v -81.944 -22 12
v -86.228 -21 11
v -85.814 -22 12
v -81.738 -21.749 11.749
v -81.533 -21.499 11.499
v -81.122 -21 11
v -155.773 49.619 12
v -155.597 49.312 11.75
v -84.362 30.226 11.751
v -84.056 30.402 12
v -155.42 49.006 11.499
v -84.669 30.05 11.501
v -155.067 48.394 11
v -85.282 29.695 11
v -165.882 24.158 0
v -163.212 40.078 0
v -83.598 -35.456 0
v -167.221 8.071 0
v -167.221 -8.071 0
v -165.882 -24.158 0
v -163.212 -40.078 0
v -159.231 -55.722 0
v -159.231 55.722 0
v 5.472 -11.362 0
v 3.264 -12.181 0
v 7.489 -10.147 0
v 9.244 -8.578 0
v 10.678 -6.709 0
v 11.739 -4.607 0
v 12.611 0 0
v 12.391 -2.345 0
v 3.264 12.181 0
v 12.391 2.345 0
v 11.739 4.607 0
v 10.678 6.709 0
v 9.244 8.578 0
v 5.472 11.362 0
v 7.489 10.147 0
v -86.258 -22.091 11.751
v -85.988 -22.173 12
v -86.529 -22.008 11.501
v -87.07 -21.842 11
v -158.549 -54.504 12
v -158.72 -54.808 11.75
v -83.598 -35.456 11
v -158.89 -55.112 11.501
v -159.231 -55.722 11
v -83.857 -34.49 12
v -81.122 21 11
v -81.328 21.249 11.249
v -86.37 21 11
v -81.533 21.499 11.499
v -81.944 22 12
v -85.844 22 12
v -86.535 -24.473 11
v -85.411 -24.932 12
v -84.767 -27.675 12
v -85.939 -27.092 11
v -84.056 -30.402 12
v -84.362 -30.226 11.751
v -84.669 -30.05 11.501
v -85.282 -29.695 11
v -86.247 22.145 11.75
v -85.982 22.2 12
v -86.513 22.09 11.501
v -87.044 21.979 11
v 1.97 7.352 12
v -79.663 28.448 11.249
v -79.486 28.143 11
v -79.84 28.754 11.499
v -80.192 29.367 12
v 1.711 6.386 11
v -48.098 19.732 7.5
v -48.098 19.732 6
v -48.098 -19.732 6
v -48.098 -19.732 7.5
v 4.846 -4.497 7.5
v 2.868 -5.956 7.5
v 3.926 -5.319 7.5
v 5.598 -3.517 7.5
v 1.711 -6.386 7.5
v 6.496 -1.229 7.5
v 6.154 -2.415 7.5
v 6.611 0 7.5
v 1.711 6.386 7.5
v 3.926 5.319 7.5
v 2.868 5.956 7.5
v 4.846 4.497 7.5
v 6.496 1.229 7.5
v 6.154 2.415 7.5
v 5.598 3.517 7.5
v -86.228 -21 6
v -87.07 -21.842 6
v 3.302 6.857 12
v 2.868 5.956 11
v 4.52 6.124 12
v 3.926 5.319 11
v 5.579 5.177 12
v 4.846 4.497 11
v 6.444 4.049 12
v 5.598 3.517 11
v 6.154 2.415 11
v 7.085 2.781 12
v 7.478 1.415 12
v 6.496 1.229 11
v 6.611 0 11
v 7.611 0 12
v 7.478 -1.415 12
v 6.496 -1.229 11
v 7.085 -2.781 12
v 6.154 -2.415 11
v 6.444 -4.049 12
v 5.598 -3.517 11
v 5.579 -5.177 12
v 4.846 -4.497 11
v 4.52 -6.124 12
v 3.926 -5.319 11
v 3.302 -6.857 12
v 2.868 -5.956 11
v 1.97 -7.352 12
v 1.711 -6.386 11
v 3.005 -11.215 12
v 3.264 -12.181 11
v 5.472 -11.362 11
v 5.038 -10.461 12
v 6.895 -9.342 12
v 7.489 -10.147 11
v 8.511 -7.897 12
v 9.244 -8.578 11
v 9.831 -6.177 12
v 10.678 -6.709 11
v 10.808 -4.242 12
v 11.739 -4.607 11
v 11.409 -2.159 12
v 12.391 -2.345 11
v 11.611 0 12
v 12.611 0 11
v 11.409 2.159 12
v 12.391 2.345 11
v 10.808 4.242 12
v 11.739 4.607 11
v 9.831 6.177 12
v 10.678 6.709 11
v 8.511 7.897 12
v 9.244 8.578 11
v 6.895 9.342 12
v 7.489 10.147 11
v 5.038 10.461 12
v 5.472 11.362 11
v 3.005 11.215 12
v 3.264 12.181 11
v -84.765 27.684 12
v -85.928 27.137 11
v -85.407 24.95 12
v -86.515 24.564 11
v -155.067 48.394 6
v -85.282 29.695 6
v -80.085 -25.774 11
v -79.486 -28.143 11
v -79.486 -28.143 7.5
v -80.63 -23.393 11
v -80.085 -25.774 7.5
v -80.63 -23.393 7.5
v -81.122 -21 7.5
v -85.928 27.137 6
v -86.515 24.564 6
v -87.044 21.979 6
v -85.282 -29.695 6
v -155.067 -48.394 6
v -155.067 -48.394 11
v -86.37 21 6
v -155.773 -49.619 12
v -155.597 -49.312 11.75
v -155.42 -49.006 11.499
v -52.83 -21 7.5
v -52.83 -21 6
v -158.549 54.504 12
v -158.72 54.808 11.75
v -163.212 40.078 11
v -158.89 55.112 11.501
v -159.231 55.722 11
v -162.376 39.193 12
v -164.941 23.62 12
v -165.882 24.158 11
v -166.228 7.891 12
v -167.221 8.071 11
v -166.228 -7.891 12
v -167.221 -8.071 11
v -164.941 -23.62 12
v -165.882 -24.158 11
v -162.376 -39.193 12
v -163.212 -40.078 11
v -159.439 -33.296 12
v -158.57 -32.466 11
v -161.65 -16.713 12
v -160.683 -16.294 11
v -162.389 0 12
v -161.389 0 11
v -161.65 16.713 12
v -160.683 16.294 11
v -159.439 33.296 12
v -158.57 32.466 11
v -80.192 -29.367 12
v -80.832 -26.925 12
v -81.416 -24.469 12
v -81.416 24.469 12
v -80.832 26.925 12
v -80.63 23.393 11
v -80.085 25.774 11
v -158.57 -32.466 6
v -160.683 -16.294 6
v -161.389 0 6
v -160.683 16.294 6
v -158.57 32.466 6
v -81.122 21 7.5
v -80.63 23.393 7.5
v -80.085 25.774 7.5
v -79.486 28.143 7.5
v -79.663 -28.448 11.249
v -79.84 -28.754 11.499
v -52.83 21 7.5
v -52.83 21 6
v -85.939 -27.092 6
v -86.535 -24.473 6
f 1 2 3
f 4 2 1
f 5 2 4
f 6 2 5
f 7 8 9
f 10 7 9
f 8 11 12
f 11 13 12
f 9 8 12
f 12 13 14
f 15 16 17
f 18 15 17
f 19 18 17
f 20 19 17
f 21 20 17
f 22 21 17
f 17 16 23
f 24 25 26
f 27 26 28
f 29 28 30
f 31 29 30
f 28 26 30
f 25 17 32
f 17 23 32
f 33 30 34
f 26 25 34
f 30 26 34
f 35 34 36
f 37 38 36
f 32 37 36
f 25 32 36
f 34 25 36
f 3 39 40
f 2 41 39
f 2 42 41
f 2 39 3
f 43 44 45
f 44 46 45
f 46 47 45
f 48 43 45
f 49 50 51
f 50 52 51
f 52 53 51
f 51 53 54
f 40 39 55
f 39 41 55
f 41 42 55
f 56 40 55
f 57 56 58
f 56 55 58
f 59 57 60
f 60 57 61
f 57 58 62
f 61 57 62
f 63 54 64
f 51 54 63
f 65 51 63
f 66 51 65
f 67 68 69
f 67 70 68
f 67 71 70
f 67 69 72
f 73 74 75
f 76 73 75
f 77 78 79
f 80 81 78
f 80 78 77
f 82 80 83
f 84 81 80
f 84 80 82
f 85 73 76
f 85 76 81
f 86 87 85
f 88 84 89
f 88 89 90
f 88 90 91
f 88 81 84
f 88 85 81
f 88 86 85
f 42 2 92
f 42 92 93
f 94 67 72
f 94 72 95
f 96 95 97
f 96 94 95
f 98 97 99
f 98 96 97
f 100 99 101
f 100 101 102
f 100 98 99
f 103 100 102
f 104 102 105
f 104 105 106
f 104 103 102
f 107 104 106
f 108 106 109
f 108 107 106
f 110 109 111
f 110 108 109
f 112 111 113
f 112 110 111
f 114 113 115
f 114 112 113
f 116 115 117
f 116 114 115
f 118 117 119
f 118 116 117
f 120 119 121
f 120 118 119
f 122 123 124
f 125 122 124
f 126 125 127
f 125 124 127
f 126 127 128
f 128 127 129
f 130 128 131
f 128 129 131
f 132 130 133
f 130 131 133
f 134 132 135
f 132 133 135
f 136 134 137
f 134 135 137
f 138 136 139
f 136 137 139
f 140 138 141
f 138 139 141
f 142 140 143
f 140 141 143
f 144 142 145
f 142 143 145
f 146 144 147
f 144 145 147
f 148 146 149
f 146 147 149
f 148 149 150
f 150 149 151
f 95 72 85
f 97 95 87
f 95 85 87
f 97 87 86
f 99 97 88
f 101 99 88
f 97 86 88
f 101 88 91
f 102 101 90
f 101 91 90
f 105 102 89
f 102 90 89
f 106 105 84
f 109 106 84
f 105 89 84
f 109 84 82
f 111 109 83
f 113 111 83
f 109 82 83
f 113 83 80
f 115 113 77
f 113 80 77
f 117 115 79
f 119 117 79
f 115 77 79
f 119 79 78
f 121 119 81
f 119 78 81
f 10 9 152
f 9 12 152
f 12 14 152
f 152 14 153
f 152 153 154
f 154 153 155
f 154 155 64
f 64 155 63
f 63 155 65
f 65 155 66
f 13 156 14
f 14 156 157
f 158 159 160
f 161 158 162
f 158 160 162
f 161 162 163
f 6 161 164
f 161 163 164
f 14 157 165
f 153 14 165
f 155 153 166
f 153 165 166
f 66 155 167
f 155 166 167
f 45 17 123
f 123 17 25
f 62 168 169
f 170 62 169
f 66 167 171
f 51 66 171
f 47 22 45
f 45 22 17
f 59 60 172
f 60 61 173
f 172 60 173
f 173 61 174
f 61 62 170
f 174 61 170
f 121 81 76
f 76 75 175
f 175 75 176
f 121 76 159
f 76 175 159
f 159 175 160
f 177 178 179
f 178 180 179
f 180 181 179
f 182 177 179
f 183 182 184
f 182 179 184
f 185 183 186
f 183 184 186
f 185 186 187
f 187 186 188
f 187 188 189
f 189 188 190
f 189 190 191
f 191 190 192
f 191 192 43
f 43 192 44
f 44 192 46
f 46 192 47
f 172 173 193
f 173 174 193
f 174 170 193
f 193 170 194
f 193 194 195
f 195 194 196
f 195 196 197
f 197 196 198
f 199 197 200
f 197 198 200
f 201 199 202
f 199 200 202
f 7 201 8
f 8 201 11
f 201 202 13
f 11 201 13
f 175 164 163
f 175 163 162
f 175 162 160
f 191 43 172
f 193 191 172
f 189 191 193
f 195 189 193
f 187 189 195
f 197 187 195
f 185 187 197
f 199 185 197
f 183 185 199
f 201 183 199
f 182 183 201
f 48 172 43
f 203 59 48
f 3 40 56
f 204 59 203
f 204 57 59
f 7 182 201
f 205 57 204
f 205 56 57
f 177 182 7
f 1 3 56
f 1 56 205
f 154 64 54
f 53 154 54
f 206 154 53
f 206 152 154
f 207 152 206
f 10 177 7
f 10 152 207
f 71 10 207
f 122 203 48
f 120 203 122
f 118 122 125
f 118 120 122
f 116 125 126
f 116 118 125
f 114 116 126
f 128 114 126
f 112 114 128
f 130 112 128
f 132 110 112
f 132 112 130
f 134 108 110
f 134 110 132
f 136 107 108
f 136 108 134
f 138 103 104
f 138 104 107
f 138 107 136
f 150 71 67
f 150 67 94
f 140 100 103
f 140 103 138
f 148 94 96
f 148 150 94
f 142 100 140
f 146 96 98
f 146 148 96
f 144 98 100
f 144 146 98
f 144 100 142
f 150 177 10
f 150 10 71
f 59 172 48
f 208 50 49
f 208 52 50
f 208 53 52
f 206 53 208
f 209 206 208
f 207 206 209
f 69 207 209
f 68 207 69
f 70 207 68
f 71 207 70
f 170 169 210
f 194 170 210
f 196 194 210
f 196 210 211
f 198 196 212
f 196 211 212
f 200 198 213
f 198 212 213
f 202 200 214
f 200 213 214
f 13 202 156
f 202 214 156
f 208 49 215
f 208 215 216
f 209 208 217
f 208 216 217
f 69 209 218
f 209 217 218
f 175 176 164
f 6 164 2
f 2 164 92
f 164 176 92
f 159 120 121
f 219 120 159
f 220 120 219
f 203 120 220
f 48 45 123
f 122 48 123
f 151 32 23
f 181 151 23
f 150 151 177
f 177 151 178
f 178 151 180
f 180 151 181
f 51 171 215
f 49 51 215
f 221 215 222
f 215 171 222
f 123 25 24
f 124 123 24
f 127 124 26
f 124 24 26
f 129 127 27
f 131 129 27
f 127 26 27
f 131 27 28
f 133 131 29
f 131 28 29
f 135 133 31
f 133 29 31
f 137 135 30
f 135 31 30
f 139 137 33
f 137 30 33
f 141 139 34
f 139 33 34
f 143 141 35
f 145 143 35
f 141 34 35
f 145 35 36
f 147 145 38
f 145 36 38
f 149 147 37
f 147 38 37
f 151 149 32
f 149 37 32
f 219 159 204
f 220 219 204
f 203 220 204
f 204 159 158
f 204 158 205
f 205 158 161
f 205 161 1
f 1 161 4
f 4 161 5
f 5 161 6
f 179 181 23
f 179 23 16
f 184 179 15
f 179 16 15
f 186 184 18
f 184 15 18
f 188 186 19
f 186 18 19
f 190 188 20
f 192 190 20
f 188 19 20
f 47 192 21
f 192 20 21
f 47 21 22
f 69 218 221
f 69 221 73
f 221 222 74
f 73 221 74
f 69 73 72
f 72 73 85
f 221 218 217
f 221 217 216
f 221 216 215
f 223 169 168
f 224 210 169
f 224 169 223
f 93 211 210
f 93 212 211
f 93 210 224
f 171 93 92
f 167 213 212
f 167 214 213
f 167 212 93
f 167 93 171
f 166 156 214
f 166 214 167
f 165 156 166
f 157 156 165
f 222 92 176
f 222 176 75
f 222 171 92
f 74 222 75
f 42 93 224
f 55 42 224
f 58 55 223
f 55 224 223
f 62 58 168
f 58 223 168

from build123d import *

# Parameters (mm, degrees)
BOSS_EXTRUDE1_DEPTH = 6
BOSS_EXTRUDE2_START = 6
BOSS_EXTRUDE2_DEPTH = 6
BOSS_EXTRUDE3_DEPTH = 1.5
CUT_EXTRUDE3_DEPTH  = 6
CHAMFER1_SIZE       = 0.858848527
CHAMFER1_SIZE_2     = 1
CHAMFER2_SIZE       = 1


with BuildPart() as part:
    # Sketch3 → Boss-Extrude1 (new body)
    with BuildSketch(Plane.XY):
        with BuildLine():
            Line((3.263957589, 12.181255556), (-159.230871571, 55.721613803))
            ThreePointArc((-159.230871571, 55.721613803), (-167.389036276, 0), (-159.230871571, -55.721613803))
            Line((-159.230871571, -55.721613803), (-83.597968128, -35.455838404))
            Line((-83.597968128, -35.455838404), (3.263957589, -12.181255556))
            ThreePointArc((3.263957589, -12.181255556), (12.610963724, 0), (3.263957589, 12.181255556))
        make_face()
    extrude(amount=BOSS_EXTRUDE1_DEPTH)

    # Sketch3<3> → Boss-Extrude2 (add)
    with BuildSketch(Plane.XY.offset(BOSS_EXTRUDE2_START)):
        with BuildLine():
            ThreePointArc((3.263957589, -12.181255556), (12.610963724, 0), (3.263957589, 12.181255556))
            Line((3.263957589, 12.181255556), (-159.230871571, 55.721613803))
            ThreePointArc((-159.230871571, 55.721613803), (-167.389036276, 0), (-159.230871571, -55.721613803))
            Line((-159.230871571, -55.721613803), (-83.597968128, -35.455838404))
            Line((-83.597968128, -35.455838404), (3.263957589, -12.181255556))
        make_face()
        with BuildLine():
            Line((-85.282065581, -29.695433875), (-155.066564747, -48.39413407))
            ThreePointArc((-155.066564747, -48.39413407), (-161.389036276, 0), (-155.066564747, 48.39413407))
            Line((-155.066564747, 48.39413407), (-85.282065581, 29.695433875))
            ThreePointArc((-85.282065581, 29.695433875), (-89.143036276, 0), (-85.282065581, -29.695433875))
        make_face(mode=Mode.SUBTRACT)
        with BuildLine():
            Line((1.711043318, -6.385700598), (-79.486479098, -28.142511157))
            ThreePointArc((-79.486479098, -28.142511157), (-83.143036276, 0), (-79.486479098, 28.142511157))
            Line((-79.486479098, 28.142511157), (1.711043318, 6.385700598))
            ThreePointArc((1.711043318, 6.385700598), (6.610963724, 0), (1.711043318, -6.385700598))
        make_face(mode=Mode.SUBTRACT)
    extrude(amount=BOSS_EXTRUDE2_DEPTH)

    # Sketch4 → Boss-Extrude3 (add)
    with BuildSketch(Plane.XY.offset(6)):
        with BuildLine():
            ThreePointArc((-79.486479098, 28.142511157), (-80.363791639, 24.584864194), (-81.12226241, 21))
            Line((-81.12226241, 21), (-52.830264568, 21))
            Line((-52.830264568, 21), (-79.486479098, 28.142511157))
        make_face()
        with BuildLine():
            Line((-79.486479098, -28.142511157), (-52.830264568, -21))
            Line((-52.830264568, -21), (-81.12226241, -21))
            ThreePointArc((-81.12226241, -21), (-80.363791639, -24.584864194), (-79.486479098, -28.142511157))
        make_face()
        with BuildLine():
            Line((-48.09821376, 19.732050808), (-48.09821376, -19.732050808))
            Line((-48.09821376, -19.732050808), (1.711043318, -6.385700598))
            ThreePointArc((1.711043318, -6.385700598), (6.610963724, 0), (1.711043318, 6.385700598))
            Line((1.711043318, 6.385700598), (-48.09821376, 19.732050808))
        make_face()
    extrude(amount=BOSS_EXTRUDE3_DEPTH)

    # Sketch5 → Cut-Extrude3 (cut)
    with BuildSketch(Plane.XY.offset(6)):
        with BuildLine():
            Line((-81.12226241, 21), (-87.228470489, 21))
            ThreePointArc((-87.228470489, 21), (-89.143036276, 0), (-87.228470489, -21))
            Line((-87.228470489, -21), (-81.12226241, -21))
            ThreePointArc((-81.12226241, -21), (-83.143036276, 0), (-81.12226241, 21))
        make_face()
    extrude(amount=CUT_EXTRUDE3_DEPTH, mode=Mode.SUBTRACT)

    # Chamfer1
    # the kernel refuses this chamfer: 1, 0.858848527 mm, written as the material it takes off along each edge
    with BuildSketch(Plane(origin=(-87.228470489, 21, 6), x_dir=(0.1850514416549976, 0.9827288354075131, 0), z_dir=(0, 0, 1))) as chamfer1_piece_1:
        with BuildLine():
            Line((0.995740125, 0), (CHAMFER1_SIZE * 0.185051441724, -CHAMFER1_SIZE * 0.982728835776))
            Line((CHAMFER1_SIZE * 0.185051441724, -CHAMFER1_SIZE * 0.982728835776), (0, 0))
            ThreePointArc((0, 0), (0.511949844, 0.001066408), (0.995740125, 0))
        make_face()
    extrude(amount=8.560742024, mode=Mode.SUBTRACT)
    with BuildSketch(Plane(origin=(-87.228470489, -21, 6), x_dir=(1, 0, 0), z_dir=(0, 0, 1))) as chamfer1_piece_2:
        with BuildLine():
            Line((CHAMFER1_SIZE_2, 0), (0.158025015, -0.841974985))
            ThreePointArc((0.158025015, -0.841974985), (0.080319075, -0.432228603), (0, 0))
            Line((0, 0), (CHAMFER1_SIZE_2, 0))
        make_face()
    extrude(amount=8.571682988, mode=Mode.SUBTRACT)

    # Chamfer2
    chamfer2_edges = [part.edges().sort_by_distance(p)[0] for p in [
        (-86.244364999, -25.784214234, 12),
        (-83.67536645, -21, 12),
        (-86.706914653, 21.489271267, 12),
        (-86.649457982, -21.420987493, 12),
        (-86.228906055, 25.852006602, 12),
        (-120.174315164, -39.044783972, 12),
        (12.610963724, 0, 12),
        (-167.389036276, 0, 12),
        (-38.88771789, 17.264105877, 12),
        (-38.88771789, -17.264105877, 12),
        (-77.983456991, 33.951434679, 12),
        (-77.983456991, -33.951434679, 12),
        (-120.174315164, 39.044783972, 12),
        (-161.389036276, 0, 12),
        (6.610963724, 0, 12),
        (-80.363791639, 24.584864194, 12),
        (-80.363791639, -24.584864194, 12),
        (-83.745942186, 21, 12),
    ]]
    chamfer(chamfer2_edges, length=CHAMFER2_SIZE)


solid = part.part
